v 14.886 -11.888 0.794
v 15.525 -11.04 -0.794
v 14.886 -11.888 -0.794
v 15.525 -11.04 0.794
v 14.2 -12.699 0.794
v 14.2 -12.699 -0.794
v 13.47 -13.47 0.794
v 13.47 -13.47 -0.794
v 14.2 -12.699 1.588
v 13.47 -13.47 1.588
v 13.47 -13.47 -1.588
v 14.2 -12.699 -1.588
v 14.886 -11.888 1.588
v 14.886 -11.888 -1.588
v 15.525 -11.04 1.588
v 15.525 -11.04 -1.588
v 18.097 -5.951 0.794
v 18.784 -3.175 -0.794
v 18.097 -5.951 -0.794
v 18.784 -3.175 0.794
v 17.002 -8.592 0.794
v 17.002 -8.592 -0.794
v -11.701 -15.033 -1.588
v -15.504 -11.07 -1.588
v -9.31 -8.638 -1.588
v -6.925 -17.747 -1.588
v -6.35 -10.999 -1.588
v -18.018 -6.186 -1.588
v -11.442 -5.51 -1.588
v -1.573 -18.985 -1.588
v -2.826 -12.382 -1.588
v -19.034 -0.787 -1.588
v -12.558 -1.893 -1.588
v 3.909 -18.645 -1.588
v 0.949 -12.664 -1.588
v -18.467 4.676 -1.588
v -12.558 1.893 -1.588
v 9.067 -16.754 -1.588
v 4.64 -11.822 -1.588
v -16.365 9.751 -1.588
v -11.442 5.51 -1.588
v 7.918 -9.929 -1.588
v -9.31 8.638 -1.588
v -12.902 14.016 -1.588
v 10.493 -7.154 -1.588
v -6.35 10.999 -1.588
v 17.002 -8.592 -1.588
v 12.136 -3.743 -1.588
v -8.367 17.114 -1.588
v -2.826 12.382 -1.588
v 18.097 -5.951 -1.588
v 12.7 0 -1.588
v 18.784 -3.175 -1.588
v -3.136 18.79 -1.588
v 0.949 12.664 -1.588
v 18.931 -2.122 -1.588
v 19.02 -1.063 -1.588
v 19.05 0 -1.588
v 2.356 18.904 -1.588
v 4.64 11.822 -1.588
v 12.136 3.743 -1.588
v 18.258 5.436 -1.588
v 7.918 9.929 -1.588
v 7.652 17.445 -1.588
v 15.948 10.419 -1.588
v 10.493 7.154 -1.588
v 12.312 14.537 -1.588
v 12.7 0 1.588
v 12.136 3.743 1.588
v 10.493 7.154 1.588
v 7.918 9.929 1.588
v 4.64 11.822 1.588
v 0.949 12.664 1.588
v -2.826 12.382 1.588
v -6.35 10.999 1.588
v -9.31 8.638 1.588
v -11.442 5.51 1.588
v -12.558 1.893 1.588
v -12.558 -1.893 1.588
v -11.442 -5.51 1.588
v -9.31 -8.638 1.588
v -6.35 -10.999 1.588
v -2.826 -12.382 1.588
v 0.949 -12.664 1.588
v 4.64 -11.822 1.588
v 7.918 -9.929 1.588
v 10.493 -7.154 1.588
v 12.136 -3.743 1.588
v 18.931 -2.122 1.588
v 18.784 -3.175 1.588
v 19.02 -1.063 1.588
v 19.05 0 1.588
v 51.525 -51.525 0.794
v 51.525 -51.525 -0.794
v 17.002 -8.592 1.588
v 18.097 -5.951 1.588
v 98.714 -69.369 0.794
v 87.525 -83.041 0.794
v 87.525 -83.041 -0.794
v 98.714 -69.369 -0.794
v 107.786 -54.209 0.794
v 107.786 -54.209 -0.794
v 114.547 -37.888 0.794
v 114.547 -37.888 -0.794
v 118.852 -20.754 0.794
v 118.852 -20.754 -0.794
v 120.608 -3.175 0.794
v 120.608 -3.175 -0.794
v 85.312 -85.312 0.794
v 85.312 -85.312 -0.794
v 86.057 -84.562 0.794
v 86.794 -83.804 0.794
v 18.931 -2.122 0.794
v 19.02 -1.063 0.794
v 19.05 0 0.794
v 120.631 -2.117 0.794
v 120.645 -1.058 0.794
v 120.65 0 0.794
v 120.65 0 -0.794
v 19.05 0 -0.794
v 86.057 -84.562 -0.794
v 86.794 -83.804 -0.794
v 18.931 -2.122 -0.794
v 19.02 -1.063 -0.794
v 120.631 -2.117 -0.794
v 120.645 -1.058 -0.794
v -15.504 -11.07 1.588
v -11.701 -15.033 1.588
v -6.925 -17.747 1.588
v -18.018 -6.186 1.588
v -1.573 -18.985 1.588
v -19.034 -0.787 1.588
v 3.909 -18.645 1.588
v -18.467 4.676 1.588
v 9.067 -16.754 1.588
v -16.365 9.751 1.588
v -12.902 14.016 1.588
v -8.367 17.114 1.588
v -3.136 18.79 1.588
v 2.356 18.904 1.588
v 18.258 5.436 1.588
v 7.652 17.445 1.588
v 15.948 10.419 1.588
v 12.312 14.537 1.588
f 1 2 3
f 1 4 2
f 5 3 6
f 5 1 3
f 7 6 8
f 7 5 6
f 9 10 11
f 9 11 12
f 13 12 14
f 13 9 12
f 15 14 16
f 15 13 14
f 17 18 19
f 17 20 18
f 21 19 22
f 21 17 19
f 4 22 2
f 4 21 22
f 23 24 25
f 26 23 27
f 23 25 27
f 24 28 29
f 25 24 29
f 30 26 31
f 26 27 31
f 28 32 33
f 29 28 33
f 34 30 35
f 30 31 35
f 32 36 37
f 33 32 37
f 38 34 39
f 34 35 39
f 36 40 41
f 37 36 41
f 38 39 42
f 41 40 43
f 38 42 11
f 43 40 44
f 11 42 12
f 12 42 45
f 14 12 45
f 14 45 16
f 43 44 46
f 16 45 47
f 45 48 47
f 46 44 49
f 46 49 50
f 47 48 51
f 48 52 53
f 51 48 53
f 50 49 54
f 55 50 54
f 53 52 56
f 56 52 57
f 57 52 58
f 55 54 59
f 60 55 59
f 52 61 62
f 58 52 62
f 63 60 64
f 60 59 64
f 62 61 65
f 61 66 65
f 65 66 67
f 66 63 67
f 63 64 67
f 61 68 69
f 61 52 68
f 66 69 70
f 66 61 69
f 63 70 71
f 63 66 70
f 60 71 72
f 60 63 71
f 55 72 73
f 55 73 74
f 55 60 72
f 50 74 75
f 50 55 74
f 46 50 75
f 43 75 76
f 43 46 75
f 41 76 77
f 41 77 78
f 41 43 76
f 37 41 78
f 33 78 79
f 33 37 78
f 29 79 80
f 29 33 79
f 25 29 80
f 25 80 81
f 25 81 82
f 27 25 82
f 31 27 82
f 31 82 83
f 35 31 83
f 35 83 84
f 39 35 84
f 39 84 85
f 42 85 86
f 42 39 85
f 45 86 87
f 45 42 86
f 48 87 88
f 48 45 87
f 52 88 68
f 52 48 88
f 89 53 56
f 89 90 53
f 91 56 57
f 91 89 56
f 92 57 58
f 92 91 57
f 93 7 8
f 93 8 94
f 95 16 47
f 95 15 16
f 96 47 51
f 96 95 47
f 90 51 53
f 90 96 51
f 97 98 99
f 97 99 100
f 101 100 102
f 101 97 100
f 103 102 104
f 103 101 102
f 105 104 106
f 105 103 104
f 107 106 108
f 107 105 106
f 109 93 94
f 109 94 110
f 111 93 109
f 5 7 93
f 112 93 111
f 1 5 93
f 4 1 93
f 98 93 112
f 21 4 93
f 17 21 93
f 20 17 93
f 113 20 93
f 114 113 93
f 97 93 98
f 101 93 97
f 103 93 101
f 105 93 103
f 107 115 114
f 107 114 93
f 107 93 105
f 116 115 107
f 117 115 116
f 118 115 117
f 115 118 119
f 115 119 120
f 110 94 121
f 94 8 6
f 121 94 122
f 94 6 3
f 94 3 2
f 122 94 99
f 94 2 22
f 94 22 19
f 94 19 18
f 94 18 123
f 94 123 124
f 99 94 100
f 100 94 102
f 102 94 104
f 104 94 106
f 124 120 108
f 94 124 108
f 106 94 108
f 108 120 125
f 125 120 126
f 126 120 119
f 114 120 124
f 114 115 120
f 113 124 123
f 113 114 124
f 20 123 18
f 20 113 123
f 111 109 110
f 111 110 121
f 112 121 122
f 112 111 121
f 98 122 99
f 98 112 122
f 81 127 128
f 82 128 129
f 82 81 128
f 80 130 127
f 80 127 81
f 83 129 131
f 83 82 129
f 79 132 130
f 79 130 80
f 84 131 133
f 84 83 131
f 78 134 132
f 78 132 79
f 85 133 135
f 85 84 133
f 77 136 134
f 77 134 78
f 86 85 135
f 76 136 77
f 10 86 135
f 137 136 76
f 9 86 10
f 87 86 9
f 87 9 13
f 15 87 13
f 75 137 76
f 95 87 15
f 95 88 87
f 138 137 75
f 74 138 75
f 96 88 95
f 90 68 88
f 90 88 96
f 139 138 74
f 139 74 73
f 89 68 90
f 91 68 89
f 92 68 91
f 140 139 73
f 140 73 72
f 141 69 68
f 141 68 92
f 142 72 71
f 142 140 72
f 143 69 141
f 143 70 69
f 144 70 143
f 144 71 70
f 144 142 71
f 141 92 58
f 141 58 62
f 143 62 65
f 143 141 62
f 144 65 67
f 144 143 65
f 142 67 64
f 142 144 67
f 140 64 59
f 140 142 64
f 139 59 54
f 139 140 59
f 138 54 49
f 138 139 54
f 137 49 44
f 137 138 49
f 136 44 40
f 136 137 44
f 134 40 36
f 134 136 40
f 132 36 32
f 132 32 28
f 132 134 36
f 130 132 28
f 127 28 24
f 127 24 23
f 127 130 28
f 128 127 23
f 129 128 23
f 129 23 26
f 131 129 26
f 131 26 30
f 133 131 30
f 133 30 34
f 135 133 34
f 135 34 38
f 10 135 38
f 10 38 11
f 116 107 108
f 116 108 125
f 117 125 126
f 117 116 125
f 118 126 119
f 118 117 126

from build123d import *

# Parameters (mm, degrees)
F0_R     = 15.875
F0_R_2   = 12.7
F1_DEPTH = 1.5875
F2_DEPTH = 0.79375


with BuildPart() as f1:
    # F0 (on Top) → F1 (new body, symmetric)
    with BuildSketch(Plane.XY):
        with BuildLine():
            ThreePointArc((18.783553, -3.175), (18.983271, -1.59308), (19.05, 0))
            ThreePointArc((19.05, 0), (-17.599905, 7.290119), (13.470384, -13.470384))
            ThreePointArc((13.470384, -13.470384), (14.548459, -12.298164), (15.524853, -11.039992))
            ThreePointArc((15.524853, -11.039992), (17.599182, -7.291864), (18.783553, -3.175))
        make_face()
        Circle(F0_R, mode=Mode.SUBTRACT)
        Circle(F0_R)
        Circle(F0_R_2, mode=Mode.SUBTRACT)
    extrude(amount=F1_DEPTH, both=True)


with BuildPart() as f2:
    # F0 (on Top) → F2 (new body, symmetric)
    with BuildSketch(Plane.XY):
        with BuildLine():
            ThreePointArc((15.524853, -11.039992), (14.548459, -12.298164), (13.470384, -13.470384))
            Line((13.470384, -13.470384), (51.525121, -51.525119))
            Line((51.525121, -51.525119), (53.87627, -49.391408))
            Line((53.87627, -49.391408), (15.524853, -11.039992))
        make_face()
        with BuildLine():
            Line((120.65, 2e-06), (19.05, 0))
            ThreePointArc((19.05, 0), (18.983271, -1.59308), (18.783553, -3.175))
            Line((18.783553, -3.175), (120.608217, -3.174998))
            ThreePointArc((120.608217, -3.174998), (120.639554, -1.587635), (120.65, 2e-06))
        make_face()
        with BuildLine():
            Line((120.608217, -3.174998), (18.783553, -3.175))
            ThreePointArc((18.783553, -3.175), (17.599182, -7.291864), (15.524853, -11.039992))
            Line((15.524853, -11.039992), (53.87627, -49.391408))
            Line((53.87627, -49.391408), (87.525389, -83.040525))
            ThreePointArc((87.525389, -83.040525), (111.465353, -46.172475), (120.608217, -3.174998))
        make_face()
        with BuildLine():
            Line((53.87627, -49.391408), (51.525121, -51.525119))
            Line((51.525121, -51.525119), (85.312435, -85.312431))
            ThreePointArc((85.312435, -85.312431), (86.426377, -84.18375), (87.525389, -83.040525))
            Line((87.525389, -83.040525), (53.87627, -49.391408))
        make_face()
    extrude(amount=F2_DEPTH, both=True)


solid = Compound([f1.part, f2.part])
